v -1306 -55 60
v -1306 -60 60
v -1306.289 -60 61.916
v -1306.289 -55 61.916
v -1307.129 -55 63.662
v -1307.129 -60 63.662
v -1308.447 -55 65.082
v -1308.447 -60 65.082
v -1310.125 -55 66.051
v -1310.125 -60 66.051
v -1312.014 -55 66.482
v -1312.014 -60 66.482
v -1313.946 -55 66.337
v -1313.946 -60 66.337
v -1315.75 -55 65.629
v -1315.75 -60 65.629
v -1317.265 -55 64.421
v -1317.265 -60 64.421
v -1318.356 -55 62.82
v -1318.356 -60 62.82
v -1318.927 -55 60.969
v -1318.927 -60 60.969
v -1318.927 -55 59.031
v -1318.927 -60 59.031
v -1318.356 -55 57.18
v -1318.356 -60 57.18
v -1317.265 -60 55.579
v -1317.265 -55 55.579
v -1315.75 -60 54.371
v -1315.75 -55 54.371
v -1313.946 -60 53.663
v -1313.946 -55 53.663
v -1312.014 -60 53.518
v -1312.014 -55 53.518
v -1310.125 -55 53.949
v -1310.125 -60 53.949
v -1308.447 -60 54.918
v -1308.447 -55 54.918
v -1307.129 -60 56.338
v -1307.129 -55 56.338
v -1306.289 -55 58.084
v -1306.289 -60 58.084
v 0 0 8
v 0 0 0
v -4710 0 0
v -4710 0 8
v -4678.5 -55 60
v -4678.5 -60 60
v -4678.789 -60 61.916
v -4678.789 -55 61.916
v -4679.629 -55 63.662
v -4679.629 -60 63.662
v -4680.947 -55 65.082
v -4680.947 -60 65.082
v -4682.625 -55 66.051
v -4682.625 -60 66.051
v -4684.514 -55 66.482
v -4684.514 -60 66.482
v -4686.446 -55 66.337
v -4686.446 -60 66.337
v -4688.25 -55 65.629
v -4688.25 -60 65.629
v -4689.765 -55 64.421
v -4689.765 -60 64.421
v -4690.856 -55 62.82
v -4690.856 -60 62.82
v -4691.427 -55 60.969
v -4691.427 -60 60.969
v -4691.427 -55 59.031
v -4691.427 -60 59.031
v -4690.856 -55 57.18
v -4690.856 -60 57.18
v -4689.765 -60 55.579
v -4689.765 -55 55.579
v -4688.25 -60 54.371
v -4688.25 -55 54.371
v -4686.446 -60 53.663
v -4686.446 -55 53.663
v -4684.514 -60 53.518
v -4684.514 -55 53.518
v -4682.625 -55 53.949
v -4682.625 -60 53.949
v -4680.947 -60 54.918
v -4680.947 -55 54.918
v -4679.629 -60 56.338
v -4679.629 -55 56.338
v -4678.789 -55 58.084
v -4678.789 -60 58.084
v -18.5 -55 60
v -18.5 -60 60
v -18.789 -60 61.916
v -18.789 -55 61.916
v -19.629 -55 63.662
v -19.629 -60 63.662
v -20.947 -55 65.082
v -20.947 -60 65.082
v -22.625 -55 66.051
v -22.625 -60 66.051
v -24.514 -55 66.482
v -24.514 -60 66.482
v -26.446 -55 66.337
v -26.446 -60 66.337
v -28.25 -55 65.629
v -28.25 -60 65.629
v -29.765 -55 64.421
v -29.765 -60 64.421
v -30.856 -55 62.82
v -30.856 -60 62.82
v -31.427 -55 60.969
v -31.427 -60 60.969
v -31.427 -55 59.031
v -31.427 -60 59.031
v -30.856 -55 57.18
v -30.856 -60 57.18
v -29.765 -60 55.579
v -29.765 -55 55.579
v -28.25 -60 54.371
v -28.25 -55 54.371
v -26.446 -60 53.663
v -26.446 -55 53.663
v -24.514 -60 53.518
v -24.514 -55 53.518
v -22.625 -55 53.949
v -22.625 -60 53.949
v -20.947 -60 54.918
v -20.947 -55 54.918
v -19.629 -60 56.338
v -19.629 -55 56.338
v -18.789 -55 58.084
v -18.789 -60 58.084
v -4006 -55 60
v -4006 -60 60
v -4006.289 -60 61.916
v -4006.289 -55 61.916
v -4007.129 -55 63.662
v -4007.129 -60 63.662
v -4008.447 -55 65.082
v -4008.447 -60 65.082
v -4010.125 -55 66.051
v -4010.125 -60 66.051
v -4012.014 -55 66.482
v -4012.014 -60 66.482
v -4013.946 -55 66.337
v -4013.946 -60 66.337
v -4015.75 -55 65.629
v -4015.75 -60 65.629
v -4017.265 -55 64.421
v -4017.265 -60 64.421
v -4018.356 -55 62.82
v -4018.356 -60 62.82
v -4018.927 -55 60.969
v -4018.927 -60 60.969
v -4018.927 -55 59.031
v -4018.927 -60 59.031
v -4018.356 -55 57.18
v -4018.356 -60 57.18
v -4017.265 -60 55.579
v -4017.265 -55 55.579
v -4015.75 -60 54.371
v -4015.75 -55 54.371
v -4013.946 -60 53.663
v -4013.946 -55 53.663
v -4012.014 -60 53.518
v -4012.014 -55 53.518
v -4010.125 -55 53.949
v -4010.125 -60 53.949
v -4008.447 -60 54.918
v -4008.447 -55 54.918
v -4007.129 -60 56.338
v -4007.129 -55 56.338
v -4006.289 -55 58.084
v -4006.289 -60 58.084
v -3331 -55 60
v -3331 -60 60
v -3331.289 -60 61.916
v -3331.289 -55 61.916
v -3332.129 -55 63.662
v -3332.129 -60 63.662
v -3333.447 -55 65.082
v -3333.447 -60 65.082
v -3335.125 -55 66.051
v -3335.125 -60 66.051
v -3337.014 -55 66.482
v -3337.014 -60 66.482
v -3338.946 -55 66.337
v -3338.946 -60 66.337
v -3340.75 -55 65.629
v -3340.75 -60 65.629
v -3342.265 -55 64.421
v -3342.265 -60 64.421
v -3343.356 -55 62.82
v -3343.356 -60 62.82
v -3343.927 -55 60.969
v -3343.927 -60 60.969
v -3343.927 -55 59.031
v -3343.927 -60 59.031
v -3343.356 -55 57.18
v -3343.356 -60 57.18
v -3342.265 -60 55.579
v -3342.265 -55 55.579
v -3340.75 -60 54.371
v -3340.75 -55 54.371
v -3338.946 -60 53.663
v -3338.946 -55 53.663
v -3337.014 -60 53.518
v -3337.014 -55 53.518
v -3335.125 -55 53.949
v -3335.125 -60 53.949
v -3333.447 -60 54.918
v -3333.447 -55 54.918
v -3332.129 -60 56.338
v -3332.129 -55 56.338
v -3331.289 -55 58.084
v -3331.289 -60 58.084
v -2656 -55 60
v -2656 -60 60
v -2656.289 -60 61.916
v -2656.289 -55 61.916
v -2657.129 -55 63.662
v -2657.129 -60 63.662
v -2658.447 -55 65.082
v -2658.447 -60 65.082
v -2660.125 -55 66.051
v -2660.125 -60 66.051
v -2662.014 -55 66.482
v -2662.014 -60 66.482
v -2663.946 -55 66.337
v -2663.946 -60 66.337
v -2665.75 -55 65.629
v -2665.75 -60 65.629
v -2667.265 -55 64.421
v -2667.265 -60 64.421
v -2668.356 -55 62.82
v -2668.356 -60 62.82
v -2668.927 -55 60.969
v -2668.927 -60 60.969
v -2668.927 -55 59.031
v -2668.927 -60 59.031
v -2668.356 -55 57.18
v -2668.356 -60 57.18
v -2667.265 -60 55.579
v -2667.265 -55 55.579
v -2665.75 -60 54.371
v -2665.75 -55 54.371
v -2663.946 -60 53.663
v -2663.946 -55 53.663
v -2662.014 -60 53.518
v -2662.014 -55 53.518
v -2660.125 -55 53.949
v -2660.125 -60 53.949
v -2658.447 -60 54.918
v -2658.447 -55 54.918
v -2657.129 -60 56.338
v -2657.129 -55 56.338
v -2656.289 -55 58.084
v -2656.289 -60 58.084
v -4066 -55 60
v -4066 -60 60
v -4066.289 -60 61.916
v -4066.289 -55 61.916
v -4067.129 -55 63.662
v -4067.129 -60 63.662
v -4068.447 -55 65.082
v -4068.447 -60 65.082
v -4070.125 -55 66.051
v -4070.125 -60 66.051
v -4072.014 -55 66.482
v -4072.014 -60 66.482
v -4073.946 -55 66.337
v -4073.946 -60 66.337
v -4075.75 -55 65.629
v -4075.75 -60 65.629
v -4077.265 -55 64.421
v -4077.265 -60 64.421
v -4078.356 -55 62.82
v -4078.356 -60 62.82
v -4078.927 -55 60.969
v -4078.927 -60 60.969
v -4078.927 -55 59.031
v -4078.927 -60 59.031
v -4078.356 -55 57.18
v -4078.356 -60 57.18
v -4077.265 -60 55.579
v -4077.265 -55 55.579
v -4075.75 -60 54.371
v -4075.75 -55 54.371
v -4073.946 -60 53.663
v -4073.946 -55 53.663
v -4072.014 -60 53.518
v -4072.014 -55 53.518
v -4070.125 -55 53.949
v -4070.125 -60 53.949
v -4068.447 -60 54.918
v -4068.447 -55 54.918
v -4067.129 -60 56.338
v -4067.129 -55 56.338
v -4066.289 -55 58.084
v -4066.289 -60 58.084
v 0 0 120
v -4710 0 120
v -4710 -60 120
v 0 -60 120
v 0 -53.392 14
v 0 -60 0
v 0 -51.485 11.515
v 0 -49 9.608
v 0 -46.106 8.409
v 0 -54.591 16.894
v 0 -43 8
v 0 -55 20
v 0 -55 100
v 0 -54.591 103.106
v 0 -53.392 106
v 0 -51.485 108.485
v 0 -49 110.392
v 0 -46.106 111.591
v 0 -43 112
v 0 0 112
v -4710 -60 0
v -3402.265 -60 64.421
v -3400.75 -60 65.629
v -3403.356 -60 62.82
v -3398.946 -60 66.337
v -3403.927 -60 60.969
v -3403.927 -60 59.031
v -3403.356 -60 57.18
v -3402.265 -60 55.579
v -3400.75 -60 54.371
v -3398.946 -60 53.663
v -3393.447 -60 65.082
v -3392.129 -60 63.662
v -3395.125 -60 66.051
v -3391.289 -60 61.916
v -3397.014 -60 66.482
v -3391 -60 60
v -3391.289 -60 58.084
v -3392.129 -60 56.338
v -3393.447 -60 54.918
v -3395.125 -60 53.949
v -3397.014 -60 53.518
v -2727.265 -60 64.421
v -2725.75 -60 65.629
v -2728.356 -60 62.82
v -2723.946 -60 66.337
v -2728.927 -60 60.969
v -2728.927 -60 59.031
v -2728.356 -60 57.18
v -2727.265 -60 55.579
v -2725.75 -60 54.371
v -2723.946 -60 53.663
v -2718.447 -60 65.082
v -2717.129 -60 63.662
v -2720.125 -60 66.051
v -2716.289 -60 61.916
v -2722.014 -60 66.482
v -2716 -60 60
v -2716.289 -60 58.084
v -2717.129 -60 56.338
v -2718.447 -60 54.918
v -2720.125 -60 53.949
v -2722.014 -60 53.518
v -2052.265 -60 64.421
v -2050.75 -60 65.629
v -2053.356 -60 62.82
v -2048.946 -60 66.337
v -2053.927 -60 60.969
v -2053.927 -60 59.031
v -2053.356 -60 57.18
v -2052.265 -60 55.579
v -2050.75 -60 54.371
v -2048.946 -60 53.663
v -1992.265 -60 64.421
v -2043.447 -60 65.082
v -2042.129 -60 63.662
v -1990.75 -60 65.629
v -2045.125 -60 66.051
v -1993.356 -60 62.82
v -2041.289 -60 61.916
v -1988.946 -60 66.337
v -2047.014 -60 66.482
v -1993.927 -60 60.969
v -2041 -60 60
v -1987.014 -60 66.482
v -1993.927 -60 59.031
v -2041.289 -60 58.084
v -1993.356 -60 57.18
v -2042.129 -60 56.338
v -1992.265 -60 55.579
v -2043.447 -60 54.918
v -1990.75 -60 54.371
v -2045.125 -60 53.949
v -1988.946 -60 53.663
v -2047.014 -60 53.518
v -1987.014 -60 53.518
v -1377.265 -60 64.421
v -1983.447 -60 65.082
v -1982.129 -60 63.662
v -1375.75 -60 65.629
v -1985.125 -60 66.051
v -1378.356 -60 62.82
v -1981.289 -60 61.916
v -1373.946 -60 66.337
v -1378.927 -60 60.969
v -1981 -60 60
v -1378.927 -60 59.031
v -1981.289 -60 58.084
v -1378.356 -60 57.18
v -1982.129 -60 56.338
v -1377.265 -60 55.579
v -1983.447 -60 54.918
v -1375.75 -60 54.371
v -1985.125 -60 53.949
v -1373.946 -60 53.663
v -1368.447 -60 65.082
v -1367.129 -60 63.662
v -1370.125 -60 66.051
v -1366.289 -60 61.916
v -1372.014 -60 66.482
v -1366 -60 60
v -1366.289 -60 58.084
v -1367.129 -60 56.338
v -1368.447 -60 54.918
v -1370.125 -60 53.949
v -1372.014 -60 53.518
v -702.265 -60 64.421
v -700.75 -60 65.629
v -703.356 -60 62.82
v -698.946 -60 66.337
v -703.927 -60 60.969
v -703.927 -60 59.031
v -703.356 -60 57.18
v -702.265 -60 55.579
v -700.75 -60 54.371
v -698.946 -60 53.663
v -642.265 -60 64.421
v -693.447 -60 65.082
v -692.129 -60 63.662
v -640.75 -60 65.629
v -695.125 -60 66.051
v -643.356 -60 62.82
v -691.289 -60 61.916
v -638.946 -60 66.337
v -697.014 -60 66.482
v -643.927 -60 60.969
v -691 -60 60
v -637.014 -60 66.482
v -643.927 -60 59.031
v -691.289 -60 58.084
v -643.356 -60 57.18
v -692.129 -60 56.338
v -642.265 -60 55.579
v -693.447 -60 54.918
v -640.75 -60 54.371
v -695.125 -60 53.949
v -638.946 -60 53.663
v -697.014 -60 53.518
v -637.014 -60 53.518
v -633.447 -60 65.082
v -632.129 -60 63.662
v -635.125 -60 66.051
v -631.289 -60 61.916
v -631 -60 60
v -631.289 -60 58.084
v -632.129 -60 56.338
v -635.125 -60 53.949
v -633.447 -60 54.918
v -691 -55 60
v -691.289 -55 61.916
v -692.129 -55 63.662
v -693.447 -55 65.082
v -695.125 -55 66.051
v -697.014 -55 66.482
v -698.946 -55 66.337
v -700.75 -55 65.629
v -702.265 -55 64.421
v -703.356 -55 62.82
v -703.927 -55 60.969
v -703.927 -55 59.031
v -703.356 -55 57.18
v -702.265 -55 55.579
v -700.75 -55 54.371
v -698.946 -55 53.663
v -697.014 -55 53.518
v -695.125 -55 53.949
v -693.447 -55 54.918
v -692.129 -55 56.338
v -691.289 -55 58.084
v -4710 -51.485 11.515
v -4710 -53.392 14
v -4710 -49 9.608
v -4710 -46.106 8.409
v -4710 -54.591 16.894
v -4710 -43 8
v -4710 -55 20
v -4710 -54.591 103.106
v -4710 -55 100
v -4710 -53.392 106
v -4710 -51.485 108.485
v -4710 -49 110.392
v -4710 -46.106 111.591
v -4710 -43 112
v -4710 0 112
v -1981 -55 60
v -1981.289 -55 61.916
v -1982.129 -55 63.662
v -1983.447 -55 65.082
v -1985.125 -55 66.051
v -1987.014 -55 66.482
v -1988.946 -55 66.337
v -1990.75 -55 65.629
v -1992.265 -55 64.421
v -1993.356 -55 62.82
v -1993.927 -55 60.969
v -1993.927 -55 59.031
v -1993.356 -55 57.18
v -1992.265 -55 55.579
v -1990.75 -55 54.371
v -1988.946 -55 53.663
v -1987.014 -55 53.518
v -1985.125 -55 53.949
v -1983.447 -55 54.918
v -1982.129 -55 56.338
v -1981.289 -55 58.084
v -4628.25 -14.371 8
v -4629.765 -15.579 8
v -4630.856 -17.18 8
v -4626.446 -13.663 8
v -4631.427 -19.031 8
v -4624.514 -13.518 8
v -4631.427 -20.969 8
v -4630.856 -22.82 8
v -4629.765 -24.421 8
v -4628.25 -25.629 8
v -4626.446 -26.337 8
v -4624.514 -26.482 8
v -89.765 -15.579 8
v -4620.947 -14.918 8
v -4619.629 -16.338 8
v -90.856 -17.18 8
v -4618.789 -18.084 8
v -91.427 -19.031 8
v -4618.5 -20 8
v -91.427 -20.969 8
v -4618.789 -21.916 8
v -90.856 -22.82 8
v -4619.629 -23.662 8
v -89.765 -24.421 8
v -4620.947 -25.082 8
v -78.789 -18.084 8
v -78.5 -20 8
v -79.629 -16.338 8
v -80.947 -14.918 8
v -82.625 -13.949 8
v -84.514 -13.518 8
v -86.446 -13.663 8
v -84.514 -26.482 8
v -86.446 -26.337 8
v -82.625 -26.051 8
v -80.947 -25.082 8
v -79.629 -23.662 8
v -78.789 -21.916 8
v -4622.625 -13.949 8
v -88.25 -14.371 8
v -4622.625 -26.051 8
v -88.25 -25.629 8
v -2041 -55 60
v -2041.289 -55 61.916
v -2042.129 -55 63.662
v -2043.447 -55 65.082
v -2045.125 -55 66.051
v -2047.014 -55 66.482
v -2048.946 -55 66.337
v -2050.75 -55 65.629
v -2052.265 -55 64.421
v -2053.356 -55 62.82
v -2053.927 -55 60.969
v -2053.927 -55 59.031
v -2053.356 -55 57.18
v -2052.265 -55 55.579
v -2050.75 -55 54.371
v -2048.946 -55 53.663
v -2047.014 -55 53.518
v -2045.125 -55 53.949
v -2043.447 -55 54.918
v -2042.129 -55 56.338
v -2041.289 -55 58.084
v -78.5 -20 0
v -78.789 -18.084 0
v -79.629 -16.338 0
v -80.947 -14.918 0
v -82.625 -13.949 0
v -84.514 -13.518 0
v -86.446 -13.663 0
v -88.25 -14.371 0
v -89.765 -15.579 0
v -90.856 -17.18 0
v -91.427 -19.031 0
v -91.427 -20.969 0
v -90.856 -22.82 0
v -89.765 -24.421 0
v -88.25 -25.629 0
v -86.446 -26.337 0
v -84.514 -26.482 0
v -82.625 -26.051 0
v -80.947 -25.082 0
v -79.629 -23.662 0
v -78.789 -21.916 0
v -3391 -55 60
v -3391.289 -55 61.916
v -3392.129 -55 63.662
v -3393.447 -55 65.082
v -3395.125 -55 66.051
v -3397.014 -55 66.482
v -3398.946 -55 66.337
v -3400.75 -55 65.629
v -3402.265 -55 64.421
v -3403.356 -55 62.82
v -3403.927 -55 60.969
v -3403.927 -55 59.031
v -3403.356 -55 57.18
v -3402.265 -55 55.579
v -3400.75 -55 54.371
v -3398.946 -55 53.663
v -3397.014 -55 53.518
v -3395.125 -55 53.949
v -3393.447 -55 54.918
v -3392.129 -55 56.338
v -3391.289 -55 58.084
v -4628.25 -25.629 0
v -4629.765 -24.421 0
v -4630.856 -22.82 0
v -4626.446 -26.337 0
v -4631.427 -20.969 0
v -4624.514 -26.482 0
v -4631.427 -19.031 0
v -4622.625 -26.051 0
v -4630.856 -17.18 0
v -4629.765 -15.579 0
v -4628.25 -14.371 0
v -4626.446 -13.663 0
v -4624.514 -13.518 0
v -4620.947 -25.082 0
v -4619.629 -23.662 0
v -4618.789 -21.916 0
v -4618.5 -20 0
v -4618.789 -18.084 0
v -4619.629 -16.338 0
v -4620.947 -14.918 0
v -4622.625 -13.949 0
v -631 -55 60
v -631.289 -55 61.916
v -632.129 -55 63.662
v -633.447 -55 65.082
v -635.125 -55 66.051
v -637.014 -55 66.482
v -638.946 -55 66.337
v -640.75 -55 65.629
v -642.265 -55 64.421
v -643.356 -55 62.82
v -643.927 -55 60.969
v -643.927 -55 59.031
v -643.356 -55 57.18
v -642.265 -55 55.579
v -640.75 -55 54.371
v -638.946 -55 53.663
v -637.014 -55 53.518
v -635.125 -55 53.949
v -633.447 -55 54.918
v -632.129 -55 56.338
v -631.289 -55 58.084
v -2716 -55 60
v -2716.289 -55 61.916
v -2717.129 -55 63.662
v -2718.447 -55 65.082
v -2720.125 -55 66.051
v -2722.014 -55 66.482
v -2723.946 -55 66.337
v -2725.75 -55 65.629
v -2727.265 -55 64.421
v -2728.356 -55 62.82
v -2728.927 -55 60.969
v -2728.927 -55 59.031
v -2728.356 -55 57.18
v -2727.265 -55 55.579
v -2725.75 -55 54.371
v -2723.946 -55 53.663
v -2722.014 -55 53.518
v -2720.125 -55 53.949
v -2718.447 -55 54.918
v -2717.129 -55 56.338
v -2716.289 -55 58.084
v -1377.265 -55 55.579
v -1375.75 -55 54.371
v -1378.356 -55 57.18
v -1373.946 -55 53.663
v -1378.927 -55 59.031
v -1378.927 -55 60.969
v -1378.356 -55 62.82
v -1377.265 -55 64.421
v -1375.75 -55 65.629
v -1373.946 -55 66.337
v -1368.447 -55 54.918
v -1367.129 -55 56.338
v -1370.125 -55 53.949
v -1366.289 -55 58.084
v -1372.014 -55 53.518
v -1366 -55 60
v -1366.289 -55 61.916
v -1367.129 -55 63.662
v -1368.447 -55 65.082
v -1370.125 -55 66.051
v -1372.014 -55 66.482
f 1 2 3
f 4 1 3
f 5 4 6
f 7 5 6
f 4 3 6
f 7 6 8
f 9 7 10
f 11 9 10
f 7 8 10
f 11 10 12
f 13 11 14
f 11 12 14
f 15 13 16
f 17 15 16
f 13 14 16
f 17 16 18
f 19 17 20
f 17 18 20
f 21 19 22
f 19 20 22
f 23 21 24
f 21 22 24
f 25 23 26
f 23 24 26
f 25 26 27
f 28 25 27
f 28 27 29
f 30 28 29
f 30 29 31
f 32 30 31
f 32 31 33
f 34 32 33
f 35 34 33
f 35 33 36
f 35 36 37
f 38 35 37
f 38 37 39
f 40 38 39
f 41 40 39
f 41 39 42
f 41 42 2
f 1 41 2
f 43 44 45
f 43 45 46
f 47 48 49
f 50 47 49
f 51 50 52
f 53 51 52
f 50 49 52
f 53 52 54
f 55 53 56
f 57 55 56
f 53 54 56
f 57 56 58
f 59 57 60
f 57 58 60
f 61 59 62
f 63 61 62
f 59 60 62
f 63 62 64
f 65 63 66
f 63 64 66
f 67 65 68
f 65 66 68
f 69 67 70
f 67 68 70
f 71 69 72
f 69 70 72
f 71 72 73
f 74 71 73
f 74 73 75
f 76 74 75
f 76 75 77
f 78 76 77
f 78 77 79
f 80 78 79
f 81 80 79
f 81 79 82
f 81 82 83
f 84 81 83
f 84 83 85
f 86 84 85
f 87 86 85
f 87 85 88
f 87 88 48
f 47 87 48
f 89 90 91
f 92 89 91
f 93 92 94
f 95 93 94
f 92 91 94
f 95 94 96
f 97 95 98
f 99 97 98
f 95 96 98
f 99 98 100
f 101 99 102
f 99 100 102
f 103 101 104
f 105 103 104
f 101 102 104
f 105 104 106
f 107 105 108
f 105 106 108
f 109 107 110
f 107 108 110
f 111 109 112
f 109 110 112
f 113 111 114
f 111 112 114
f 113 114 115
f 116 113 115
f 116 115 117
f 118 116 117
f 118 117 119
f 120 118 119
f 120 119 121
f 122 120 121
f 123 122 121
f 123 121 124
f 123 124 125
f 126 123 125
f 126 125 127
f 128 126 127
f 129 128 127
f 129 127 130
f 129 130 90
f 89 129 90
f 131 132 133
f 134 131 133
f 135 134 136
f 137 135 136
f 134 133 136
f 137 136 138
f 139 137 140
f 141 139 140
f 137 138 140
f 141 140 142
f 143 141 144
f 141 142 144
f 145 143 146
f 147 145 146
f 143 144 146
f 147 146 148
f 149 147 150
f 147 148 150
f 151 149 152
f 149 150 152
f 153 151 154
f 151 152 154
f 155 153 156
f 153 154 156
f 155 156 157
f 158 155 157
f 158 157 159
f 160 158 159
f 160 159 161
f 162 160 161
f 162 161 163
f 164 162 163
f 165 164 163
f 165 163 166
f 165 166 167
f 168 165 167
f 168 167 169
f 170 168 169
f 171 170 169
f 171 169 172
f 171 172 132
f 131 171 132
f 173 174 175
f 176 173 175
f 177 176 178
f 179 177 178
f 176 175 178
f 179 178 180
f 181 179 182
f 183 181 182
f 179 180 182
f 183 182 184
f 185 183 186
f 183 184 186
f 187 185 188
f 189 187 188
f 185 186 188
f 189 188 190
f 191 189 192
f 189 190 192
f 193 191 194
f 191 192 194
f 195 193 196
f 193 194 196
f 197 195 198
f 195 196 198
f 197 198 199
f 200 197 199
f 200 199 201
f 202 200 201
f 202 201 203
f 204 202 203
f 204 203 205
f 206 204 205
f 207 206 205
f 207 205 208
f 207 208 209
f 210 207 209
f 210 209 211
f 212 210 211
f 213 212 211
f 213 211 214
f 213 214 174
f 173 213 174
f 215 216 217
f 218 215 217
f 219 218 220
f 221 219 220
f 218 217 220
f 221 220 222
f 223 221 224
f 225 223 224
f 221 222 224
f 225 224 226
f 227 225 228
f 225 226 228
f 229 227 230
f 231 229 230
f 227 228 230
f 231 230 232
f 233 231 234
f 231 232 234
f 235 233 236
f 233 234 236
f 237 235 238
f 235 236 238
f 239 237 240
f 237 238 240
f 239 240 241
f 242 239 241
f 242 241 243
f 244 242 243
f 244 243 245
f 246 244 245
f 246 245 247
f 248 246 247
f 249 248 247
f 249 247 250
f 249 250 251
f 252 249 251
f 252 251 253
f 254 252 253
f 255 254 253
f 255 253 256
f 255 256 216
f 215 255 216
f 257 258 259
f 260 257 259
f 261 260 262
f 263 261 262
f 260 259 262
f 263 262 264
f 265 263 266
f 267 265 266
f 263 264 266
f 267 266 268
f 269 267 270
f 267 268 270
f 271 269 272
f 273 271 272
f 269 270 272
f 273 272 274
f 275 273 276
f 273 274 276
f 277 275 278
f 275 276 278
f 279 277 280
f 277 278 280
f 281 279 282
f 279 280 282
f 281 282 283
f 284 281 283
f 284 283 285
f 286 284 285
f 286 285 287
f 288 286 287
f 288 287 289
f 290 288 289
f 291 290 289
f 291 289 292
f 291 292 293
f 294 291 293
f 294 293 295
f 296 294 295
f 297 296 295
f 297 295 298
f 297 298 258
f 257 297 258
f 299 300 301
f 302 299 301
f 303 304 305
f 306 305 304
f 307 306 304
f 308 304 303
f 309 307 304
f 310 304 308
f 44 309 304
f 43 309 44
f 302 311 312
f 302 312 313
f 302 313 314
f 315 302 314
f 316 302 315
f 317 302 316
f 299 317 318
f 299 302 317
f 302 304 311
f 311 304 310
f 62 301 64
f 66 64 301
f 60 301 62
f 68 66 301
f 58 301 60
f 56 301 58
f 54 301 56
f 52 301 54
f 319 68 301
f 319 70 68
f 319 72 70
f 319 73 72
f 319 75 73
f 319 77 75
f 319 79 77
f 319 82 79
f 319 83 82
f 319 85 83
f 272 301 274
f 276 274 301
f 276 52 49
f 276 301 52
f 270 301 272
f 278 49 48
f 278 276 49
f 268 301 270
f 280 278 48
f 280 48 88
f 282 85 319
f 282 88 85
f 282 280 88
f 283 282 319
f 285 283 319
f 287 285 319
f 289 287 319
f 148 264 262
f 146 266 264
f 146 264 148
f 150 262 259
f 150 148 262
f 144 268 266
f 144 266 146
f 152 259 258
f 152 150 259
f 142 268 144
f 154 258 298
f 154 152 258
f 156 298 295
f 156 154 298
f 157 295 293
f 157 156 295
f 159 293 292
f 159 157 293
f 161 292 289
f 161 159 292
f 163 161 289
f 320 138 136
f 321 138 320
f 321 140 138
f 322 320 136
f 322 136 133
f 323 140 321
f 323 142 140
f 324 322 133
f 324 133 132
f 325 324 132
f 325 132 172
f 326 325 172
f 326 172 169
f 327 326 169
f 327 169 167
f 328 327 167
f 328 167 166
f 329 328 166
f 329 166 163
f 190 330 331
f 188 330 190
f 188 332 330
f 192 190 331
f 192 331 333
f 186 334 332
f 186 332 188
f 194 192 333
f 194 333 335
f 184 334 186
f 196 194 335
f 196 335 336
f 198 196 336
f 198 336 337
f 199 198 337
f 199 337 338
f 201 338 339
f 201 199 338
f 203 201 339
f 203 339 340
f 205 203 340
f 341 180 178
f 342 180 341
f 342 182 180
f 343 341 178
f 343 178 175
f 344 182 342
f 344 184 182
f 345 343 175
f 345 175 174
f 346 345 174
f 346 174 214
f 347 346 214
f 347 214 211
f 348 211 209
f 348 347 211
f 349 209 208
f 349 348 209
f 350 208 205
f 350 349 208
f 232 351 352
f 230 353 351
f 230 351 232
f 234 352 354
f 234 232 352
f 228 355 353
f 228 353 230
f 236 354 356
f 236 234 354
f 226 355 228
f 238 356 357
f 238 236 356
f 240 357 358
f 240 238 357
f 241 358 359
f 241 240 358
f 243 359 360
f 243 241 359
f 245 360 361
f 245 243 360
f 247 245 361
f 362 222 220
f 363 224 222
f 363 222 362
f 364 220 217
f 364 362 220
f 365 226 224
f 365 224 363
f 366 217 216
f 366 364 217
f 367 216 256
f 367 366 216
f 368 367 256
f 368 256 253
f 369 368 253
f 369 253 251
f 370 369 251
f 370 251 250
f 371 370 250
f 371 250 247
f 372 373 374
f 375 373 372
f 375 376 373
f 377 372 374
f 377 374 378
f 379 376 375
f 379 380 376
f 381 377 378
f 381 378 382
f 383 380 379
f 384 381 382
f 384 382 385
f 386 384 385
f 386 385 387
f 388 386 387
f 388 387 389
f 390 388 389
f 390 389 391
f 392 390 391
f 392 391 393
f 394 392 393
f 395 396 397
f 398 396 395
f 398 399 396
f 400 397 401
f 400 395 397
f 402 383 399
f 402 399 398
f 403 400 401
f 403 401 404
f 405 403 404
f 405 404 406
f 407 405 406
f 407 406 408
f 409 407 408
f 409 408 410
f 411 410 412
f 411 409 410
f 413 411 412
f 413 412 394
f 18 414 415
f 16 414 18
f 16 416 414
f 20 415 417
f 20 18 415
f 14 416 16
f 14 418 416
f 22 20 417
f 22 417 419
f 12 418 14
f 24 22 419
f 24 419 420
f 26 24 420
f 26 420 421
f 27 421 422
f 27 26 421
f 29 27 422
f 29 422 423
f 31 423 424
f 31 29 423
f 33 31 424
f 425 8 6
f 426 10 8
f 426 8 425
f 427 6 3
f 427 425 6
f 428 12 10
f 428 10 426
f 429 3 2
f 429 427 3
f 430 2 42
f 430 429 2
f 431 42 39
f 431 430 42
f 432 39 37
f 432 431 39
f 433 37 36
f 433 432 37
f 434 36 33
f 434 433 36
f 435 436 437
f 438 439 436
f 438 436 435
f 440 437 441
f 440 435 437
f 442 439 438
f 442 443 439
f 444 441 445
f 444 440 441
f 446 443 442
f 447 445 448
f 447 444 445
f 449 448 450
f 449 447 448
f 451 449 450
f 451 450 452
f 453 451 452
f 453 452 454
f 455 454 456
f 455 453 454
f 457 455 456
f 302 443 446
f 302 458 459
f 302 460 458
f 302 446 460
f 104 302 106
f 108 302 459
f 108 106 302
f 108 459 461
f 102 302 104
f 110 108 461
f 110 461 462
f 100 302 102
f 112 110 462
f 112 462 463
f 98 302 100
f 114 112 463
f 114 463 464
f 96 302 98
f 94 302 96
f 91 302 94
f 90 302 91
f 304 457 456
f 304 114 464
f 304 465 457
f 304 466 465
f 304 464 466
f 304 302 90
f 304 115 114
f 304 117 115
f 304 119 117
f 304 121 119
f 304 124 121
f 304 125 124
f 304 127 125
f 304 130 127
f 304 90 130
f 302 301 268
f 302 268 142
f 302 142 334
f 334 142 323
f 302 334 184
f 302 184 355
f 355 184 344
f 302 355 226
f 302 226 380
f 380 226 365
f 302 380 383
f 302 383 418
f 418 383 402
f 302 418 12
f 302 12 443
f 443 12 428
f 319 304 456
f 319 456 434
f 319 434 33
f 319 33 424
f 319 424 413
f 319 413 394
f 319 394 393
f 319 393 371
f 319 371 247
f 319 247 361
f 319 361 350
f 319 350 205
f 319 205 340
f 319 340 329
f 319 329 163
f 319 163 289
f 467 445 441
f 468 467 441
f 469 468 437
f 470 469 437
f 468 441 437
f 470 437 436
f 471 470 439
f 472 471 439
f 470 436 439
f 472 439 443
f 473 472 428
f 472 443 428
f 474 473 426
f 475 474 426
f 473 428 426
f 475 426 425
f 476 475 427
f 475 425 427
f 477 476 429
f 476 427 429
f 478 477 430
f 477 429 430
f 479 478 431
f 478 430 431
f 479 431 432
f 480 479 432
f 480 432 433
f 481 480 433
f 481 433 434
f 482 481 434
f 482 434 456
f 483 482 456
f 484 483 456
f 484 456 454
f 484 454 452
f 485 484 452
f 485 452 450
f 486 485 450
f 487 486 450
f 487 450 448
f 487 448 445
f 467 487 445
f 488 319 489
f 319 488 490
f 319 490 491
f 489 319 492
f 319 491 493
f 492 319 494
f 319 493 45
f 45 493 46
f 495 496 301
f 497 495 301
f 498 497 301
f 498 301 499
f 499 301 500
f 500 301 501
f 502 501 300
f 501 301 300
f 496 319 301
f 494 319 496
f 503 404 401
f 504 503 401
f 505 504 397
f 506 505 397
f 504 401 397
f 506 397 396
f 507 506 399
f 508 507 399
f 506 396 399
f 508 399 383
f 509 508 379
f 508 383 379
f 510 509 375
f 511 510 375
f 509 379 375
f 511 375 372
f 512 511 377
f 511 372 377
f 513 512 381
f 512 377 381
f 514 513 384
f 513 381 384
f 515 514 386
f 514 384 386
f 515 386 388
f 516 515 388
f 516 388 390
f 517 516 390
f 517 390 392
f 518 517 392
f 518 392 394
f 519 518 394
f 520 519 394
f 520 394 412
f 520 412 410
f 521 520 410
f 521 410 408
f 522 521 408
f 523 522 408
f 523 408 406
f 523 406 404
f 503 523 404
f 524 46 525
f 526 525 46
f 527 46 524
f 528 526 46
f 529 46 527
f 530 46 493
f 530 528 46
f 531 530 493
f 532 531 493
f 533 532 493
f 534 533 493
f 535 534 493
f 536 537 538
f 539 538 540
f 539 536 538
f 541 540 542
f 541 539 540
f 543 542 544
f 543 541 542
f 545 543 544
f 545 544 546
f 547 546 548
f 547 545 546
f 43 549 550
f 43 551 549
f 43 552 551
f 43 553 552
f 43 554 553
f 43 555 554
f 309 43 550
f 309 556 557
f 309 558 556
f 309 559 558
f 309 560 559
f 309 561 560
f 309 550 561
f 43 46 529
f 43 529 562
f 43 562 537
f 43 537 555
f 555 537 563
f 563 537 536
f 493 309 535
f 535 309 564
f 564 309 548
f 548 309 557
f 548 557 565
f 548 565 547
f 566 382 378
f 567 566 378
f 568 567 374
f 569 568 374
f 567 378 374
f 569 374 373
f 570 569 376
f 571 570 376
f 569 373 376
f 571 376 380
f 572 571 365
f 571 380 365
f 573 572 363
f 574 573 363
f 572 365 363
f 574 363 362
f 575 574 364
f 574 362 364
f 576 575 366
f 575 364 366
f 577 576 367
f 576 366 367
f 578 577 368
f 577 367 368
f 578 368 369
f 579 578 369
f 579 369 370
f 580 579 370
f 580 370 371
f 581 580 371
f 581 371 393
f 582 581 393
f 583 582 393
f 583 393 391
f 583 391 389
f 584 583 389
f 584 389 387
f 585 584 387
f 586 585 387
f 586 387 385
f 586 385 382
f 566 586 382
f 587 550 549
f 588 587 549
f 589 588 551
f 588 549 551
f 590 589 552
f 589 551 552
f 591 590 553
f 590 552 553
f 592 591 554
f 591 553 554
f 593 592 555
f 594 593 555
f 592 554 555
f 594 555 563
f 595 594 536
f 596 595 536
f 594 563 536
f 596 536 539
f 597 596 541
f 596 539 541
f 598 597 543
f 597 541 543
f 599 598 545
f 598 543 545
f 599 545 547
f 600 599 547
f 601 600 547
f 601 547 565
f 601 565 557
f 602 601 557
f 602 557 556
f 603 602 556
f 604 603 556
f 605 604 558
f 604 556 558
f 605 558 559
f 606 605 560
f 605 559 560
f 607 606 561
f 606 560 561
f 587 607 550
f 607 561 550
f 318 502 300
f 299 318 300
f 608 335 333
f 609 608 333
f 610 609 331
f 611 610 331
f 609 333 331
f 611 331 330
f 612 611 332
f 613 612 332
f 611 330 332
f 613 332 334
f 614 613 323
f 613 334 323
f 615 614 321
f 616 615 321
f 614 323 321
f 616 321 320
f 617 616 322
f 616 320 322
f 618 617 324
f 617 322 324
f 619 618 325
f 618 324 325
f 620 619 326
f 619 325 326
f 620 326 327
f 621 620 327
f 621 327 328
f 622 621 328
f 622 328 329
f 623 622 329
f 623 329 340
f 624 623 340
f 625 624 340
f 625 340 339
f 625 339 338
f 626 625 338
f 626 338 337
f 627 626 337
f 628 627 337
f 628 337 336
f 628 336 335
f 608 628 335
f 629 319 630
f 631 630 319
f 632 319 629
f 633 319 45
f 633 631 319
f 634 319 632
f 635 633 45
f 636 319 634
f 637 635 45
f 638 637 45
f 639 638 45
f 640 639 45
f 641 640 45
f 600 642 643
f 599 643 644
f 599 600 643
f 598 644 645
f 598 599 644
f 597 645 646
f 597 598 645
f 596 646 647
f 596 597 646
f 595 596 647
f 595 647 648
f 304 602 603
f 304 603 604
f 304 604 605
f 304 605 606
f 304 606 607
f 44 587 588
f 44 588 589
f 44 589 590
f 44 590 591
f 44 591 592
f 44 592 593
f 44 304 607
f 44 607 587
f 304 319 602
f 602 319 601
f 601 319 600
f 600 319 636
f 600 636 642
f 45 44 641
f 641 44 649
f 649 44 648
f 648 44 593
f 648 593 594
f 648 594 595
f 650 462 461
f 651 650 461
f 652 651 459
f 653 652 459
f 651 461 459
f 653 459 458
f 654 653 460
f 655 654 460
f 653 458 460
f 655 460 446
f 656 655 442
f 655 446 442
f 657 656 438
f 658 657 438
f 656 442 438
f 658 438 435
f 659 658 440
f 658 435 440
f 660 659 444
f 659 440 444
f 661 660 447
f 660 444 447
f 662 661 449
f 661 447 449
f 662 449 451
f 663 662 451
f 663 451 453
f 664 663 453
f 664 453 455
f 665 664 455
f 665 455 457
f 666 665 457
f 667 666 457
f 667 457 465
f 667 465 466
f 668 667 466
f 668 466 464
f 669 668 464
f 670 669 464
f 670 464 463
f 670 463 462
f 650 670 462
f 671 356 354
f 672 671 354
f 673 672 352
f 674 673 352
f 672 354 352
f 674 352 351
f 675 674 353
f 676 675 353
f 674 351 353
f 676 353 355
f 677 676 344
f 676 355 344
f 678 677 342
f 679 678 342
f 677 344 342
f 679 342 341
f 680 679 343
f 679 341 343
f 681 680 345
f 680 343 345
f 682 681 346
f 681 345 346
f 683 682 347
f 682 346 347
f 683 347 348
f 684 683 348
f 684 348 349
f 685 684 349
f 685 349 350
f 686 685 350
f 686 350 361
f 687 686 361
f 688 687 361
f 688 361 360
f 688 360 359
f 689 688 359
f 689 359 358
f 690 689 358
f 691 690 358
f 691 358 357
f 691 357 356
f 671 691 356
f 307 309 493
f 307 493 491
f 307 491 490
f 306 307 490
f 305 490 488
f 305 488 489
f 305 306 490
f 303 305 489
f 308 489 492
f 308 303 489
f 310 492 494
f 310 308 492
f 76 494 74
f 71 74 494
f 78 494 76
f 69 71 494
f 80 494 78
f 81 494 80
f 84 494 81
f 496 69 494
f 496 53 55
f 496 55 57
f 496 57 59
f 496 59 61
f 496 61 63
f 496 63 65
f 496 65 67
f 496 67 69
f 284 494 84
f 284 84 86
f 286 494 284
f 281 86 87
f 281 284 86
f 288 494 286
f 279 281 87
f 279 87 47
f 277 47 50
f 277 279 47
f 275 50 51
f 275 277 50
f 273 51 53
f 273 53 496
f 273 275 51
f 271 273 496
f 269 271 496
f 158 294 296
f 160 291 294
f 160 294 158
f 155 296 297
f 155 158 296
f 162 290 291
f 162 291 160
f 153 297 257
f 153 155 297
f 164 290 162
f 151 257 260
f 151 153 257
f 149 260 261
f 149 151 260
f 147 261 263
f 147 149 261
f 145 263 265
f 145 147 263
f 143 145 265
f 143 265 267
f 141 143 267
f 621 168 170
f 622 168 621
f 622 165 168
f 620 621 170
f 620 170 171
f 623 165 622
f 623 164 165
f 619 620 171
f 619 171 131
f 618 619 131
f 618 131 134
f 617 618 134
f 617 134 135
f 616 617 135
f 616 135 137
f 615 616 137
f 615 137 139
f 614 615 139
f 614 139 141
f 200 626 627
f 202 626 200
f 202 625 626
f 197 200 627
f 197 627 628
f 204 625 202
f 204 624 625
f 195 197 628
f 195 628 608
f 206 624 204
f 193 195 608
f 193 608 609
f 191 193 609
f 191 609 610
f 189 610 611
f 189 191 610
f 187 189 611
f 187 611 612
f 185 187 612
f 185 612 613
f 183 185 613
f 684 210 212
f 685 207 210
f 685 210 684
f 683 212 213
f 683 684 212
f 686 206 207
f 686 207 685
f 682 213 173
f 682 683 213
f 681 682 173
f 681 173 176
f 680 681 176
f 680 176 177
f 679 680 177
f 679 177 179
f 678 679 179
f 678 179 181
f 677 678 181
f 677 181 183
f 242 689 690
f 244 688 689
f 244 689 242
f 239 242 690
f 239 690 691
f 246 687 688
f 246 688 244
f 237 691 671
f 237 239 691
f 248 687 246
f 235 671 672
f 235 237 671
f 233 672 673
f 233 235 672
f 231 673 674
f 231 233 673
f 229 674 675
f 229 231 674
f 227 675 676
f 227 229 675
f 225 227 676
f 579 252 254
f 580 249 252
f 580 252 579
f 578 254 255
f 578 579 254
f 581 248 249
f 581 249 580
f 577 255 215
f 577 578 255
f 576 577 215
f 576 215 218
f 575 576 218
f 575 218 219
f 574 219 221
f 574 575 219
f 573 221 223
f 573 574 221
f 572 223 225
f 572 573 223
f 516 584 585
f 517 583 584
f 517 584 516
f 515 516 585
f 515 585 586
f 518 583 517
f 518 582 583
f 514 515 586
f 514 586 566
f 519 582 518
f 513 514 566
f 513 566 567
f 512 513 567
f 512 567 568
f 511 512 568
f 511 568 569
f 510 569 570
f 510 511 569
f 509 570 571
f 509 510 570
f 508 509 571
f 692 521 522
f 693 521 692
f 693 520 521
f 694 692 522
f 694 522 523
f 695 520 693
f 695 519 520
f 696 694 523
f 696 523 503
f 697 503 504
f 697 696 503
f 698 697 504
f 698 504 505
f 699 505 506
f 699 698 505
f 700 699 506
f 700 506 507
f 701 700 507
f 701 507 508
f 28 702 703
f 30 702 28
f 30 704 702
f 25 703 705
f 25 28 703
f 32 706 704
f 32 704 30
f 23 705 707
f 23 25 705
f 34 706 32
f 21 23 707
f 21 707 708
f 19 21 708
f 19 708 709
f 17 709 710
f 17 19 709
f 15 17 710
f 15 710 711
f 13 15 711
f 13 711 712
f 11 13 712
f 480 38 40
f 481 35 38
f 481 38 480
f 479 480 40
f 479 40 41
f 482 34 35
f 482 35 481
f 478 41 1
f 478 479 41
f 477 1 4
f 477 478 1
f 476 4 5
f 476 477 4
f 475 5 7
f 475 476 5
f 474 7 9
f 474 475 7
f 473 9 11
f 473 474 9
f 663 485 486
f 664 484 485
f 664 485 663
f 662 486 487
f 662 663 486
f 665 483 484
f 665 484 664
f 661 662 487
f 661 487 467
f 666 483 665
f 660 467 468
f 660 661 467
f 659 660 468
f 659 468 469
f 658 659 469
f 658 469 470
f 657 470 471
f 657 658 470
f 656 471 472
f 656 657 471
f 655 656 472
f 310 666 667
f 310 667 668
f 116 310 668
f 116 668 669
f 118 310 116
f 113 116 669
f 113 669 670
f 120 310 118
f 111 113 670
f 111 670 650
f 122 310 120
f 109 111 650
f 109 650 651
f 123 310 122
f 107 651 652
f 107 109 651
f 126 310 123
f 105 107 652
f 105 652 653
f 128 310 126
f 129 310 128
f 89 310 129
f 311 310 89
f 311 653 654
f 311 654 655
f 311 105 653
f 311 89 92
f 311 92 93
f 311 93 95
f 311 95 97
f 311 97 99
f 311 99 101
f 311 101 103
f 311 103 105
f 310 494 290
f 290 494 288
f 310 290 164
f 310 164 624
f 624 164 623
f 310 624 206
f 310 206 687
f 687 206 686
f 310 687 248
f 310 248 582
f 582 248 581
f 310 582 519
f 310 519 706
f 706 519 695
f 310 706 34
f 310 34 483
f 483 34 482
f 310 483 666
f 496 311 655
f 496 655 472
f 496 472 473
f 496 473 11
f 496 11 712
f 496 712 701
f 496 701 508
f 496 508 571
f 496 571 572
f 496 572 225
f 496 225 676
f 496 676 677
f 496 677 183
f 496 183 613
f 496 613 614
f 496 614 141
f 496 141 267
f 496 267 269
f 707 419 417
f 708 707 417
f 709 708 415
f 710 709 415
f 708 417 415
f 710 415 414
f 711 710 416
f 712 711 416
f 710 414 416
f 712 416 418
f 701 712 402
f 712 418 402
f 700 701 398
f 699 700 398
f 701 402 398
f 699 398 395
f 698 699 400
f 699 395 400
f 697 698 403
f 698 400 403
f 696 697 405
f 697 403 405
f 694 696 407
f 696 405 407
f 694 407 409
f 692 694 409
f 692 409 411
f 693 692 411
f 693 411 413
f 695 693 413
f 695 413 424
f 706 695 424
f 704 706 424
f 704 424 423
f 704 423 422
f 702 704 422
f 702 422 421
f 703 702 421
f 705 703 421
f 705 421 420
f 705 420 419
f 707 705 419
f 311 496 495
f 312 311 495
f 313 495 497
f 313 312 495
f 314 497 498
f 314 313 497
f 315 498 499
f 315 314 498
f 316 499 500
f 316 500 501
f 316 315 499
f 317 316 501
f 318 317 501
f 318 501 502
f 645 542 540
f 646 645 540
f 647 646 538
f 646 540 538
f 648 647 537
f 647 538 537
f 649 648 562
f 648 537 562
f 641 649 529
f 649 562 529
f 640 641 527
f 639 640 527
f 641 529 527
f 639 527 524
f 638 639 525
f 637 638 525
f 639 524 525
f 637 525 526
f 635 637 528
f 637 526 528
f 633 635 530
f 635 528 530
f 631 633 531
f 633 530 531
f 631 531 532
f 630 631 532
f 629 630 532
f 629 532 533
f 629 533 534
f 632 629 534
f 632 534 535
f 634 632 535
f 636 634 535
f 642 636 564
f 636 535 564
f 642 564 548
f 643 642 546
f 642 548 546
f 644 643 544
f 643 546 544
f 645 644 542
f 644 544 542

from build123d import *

# Parameters (mm, degrees)
F3_DEPTH = 4710
F4_R     = 6.5
F5_DEPTH = 8
F6_R     = 6.5
F7_DEPTH = 60.001


with BuildPart() as f3:
    # F2 (on Right) → F3 (new body)
    with BuildSketch(Plane.YZ):
        with BuildLine():
            Line((-60, 0), (0, 0))
            Line((0, 0), (0, 8))
            Line((0, 8), (-43, 8))
            ThreePointArc((-43, 8), (-51.4852813742, 11.5147186258), (-55, 20))
            Line((-55, 20), (-55, 100))
            ThreePointArc((-55, 100), (-51.4852813742, 108.4852813742), (-43, 112))
            Line((-43, 112), (0, 112))
            Line((0, 112), (0, 120))
            Line((0, 120), (-60, 120))
            Line((-60, 120), (-60, 0))
        make_face()
    extrude(amount=-F3_DEPTH)

    # F4 (on face) → F5 (cut, through all)
    with BuildSketch(Plane.XY.offset(8)):
        with Locations((-85, -20)):
            Circle(F4_R)
        with Locations((-4625, -20)):
            Circle(F4_R)
    extrude(amount=-F5_DEPTH, mode=Mode.SUBTRACT)

    # F6 (on face) → F7 (cut, through all)
    with BuildSketch(Plane.XZ.offset(60)):
        with Locations((-2047.5, 60)):
            Circle(F6_R)
        with Locations((-1987.5, 60)):
            Circle(F6_R)
        with Locations((-1372.5, 60)):
            Circle(F6_R)
        with Locations((-1312.5, 60)):
            Circle(F6_R)
        with Locations((-697.5, 60)):
            Circle(F6_R)
        with Locations((-637.5, 60)):
            Circle(F6_R)
        with Locations((-25, 60)):
            Circle(F6_R)
        with Locations((-2662.5, 60)):
            Circle(F6_R)
        with Locations((-2722.5, 60)):
            Circle(F6_R)
        with Locations((-3337.5, 60)):
            Circle(F6_R)
        with Locations((-3397.5, 60)):
            Circle(F6_R)
        with Locations((-4012.5, 60)):
            Circle(F6_R)
        with Locations((-4072.5, 60)):
            Circle(F6_R)
        with Locations((-4685, 60)):
            Circle(F6_R)
    extrude(amount=-F7_DEPTH, mode=Mode.SUBTRACT)


solid = f3.part
